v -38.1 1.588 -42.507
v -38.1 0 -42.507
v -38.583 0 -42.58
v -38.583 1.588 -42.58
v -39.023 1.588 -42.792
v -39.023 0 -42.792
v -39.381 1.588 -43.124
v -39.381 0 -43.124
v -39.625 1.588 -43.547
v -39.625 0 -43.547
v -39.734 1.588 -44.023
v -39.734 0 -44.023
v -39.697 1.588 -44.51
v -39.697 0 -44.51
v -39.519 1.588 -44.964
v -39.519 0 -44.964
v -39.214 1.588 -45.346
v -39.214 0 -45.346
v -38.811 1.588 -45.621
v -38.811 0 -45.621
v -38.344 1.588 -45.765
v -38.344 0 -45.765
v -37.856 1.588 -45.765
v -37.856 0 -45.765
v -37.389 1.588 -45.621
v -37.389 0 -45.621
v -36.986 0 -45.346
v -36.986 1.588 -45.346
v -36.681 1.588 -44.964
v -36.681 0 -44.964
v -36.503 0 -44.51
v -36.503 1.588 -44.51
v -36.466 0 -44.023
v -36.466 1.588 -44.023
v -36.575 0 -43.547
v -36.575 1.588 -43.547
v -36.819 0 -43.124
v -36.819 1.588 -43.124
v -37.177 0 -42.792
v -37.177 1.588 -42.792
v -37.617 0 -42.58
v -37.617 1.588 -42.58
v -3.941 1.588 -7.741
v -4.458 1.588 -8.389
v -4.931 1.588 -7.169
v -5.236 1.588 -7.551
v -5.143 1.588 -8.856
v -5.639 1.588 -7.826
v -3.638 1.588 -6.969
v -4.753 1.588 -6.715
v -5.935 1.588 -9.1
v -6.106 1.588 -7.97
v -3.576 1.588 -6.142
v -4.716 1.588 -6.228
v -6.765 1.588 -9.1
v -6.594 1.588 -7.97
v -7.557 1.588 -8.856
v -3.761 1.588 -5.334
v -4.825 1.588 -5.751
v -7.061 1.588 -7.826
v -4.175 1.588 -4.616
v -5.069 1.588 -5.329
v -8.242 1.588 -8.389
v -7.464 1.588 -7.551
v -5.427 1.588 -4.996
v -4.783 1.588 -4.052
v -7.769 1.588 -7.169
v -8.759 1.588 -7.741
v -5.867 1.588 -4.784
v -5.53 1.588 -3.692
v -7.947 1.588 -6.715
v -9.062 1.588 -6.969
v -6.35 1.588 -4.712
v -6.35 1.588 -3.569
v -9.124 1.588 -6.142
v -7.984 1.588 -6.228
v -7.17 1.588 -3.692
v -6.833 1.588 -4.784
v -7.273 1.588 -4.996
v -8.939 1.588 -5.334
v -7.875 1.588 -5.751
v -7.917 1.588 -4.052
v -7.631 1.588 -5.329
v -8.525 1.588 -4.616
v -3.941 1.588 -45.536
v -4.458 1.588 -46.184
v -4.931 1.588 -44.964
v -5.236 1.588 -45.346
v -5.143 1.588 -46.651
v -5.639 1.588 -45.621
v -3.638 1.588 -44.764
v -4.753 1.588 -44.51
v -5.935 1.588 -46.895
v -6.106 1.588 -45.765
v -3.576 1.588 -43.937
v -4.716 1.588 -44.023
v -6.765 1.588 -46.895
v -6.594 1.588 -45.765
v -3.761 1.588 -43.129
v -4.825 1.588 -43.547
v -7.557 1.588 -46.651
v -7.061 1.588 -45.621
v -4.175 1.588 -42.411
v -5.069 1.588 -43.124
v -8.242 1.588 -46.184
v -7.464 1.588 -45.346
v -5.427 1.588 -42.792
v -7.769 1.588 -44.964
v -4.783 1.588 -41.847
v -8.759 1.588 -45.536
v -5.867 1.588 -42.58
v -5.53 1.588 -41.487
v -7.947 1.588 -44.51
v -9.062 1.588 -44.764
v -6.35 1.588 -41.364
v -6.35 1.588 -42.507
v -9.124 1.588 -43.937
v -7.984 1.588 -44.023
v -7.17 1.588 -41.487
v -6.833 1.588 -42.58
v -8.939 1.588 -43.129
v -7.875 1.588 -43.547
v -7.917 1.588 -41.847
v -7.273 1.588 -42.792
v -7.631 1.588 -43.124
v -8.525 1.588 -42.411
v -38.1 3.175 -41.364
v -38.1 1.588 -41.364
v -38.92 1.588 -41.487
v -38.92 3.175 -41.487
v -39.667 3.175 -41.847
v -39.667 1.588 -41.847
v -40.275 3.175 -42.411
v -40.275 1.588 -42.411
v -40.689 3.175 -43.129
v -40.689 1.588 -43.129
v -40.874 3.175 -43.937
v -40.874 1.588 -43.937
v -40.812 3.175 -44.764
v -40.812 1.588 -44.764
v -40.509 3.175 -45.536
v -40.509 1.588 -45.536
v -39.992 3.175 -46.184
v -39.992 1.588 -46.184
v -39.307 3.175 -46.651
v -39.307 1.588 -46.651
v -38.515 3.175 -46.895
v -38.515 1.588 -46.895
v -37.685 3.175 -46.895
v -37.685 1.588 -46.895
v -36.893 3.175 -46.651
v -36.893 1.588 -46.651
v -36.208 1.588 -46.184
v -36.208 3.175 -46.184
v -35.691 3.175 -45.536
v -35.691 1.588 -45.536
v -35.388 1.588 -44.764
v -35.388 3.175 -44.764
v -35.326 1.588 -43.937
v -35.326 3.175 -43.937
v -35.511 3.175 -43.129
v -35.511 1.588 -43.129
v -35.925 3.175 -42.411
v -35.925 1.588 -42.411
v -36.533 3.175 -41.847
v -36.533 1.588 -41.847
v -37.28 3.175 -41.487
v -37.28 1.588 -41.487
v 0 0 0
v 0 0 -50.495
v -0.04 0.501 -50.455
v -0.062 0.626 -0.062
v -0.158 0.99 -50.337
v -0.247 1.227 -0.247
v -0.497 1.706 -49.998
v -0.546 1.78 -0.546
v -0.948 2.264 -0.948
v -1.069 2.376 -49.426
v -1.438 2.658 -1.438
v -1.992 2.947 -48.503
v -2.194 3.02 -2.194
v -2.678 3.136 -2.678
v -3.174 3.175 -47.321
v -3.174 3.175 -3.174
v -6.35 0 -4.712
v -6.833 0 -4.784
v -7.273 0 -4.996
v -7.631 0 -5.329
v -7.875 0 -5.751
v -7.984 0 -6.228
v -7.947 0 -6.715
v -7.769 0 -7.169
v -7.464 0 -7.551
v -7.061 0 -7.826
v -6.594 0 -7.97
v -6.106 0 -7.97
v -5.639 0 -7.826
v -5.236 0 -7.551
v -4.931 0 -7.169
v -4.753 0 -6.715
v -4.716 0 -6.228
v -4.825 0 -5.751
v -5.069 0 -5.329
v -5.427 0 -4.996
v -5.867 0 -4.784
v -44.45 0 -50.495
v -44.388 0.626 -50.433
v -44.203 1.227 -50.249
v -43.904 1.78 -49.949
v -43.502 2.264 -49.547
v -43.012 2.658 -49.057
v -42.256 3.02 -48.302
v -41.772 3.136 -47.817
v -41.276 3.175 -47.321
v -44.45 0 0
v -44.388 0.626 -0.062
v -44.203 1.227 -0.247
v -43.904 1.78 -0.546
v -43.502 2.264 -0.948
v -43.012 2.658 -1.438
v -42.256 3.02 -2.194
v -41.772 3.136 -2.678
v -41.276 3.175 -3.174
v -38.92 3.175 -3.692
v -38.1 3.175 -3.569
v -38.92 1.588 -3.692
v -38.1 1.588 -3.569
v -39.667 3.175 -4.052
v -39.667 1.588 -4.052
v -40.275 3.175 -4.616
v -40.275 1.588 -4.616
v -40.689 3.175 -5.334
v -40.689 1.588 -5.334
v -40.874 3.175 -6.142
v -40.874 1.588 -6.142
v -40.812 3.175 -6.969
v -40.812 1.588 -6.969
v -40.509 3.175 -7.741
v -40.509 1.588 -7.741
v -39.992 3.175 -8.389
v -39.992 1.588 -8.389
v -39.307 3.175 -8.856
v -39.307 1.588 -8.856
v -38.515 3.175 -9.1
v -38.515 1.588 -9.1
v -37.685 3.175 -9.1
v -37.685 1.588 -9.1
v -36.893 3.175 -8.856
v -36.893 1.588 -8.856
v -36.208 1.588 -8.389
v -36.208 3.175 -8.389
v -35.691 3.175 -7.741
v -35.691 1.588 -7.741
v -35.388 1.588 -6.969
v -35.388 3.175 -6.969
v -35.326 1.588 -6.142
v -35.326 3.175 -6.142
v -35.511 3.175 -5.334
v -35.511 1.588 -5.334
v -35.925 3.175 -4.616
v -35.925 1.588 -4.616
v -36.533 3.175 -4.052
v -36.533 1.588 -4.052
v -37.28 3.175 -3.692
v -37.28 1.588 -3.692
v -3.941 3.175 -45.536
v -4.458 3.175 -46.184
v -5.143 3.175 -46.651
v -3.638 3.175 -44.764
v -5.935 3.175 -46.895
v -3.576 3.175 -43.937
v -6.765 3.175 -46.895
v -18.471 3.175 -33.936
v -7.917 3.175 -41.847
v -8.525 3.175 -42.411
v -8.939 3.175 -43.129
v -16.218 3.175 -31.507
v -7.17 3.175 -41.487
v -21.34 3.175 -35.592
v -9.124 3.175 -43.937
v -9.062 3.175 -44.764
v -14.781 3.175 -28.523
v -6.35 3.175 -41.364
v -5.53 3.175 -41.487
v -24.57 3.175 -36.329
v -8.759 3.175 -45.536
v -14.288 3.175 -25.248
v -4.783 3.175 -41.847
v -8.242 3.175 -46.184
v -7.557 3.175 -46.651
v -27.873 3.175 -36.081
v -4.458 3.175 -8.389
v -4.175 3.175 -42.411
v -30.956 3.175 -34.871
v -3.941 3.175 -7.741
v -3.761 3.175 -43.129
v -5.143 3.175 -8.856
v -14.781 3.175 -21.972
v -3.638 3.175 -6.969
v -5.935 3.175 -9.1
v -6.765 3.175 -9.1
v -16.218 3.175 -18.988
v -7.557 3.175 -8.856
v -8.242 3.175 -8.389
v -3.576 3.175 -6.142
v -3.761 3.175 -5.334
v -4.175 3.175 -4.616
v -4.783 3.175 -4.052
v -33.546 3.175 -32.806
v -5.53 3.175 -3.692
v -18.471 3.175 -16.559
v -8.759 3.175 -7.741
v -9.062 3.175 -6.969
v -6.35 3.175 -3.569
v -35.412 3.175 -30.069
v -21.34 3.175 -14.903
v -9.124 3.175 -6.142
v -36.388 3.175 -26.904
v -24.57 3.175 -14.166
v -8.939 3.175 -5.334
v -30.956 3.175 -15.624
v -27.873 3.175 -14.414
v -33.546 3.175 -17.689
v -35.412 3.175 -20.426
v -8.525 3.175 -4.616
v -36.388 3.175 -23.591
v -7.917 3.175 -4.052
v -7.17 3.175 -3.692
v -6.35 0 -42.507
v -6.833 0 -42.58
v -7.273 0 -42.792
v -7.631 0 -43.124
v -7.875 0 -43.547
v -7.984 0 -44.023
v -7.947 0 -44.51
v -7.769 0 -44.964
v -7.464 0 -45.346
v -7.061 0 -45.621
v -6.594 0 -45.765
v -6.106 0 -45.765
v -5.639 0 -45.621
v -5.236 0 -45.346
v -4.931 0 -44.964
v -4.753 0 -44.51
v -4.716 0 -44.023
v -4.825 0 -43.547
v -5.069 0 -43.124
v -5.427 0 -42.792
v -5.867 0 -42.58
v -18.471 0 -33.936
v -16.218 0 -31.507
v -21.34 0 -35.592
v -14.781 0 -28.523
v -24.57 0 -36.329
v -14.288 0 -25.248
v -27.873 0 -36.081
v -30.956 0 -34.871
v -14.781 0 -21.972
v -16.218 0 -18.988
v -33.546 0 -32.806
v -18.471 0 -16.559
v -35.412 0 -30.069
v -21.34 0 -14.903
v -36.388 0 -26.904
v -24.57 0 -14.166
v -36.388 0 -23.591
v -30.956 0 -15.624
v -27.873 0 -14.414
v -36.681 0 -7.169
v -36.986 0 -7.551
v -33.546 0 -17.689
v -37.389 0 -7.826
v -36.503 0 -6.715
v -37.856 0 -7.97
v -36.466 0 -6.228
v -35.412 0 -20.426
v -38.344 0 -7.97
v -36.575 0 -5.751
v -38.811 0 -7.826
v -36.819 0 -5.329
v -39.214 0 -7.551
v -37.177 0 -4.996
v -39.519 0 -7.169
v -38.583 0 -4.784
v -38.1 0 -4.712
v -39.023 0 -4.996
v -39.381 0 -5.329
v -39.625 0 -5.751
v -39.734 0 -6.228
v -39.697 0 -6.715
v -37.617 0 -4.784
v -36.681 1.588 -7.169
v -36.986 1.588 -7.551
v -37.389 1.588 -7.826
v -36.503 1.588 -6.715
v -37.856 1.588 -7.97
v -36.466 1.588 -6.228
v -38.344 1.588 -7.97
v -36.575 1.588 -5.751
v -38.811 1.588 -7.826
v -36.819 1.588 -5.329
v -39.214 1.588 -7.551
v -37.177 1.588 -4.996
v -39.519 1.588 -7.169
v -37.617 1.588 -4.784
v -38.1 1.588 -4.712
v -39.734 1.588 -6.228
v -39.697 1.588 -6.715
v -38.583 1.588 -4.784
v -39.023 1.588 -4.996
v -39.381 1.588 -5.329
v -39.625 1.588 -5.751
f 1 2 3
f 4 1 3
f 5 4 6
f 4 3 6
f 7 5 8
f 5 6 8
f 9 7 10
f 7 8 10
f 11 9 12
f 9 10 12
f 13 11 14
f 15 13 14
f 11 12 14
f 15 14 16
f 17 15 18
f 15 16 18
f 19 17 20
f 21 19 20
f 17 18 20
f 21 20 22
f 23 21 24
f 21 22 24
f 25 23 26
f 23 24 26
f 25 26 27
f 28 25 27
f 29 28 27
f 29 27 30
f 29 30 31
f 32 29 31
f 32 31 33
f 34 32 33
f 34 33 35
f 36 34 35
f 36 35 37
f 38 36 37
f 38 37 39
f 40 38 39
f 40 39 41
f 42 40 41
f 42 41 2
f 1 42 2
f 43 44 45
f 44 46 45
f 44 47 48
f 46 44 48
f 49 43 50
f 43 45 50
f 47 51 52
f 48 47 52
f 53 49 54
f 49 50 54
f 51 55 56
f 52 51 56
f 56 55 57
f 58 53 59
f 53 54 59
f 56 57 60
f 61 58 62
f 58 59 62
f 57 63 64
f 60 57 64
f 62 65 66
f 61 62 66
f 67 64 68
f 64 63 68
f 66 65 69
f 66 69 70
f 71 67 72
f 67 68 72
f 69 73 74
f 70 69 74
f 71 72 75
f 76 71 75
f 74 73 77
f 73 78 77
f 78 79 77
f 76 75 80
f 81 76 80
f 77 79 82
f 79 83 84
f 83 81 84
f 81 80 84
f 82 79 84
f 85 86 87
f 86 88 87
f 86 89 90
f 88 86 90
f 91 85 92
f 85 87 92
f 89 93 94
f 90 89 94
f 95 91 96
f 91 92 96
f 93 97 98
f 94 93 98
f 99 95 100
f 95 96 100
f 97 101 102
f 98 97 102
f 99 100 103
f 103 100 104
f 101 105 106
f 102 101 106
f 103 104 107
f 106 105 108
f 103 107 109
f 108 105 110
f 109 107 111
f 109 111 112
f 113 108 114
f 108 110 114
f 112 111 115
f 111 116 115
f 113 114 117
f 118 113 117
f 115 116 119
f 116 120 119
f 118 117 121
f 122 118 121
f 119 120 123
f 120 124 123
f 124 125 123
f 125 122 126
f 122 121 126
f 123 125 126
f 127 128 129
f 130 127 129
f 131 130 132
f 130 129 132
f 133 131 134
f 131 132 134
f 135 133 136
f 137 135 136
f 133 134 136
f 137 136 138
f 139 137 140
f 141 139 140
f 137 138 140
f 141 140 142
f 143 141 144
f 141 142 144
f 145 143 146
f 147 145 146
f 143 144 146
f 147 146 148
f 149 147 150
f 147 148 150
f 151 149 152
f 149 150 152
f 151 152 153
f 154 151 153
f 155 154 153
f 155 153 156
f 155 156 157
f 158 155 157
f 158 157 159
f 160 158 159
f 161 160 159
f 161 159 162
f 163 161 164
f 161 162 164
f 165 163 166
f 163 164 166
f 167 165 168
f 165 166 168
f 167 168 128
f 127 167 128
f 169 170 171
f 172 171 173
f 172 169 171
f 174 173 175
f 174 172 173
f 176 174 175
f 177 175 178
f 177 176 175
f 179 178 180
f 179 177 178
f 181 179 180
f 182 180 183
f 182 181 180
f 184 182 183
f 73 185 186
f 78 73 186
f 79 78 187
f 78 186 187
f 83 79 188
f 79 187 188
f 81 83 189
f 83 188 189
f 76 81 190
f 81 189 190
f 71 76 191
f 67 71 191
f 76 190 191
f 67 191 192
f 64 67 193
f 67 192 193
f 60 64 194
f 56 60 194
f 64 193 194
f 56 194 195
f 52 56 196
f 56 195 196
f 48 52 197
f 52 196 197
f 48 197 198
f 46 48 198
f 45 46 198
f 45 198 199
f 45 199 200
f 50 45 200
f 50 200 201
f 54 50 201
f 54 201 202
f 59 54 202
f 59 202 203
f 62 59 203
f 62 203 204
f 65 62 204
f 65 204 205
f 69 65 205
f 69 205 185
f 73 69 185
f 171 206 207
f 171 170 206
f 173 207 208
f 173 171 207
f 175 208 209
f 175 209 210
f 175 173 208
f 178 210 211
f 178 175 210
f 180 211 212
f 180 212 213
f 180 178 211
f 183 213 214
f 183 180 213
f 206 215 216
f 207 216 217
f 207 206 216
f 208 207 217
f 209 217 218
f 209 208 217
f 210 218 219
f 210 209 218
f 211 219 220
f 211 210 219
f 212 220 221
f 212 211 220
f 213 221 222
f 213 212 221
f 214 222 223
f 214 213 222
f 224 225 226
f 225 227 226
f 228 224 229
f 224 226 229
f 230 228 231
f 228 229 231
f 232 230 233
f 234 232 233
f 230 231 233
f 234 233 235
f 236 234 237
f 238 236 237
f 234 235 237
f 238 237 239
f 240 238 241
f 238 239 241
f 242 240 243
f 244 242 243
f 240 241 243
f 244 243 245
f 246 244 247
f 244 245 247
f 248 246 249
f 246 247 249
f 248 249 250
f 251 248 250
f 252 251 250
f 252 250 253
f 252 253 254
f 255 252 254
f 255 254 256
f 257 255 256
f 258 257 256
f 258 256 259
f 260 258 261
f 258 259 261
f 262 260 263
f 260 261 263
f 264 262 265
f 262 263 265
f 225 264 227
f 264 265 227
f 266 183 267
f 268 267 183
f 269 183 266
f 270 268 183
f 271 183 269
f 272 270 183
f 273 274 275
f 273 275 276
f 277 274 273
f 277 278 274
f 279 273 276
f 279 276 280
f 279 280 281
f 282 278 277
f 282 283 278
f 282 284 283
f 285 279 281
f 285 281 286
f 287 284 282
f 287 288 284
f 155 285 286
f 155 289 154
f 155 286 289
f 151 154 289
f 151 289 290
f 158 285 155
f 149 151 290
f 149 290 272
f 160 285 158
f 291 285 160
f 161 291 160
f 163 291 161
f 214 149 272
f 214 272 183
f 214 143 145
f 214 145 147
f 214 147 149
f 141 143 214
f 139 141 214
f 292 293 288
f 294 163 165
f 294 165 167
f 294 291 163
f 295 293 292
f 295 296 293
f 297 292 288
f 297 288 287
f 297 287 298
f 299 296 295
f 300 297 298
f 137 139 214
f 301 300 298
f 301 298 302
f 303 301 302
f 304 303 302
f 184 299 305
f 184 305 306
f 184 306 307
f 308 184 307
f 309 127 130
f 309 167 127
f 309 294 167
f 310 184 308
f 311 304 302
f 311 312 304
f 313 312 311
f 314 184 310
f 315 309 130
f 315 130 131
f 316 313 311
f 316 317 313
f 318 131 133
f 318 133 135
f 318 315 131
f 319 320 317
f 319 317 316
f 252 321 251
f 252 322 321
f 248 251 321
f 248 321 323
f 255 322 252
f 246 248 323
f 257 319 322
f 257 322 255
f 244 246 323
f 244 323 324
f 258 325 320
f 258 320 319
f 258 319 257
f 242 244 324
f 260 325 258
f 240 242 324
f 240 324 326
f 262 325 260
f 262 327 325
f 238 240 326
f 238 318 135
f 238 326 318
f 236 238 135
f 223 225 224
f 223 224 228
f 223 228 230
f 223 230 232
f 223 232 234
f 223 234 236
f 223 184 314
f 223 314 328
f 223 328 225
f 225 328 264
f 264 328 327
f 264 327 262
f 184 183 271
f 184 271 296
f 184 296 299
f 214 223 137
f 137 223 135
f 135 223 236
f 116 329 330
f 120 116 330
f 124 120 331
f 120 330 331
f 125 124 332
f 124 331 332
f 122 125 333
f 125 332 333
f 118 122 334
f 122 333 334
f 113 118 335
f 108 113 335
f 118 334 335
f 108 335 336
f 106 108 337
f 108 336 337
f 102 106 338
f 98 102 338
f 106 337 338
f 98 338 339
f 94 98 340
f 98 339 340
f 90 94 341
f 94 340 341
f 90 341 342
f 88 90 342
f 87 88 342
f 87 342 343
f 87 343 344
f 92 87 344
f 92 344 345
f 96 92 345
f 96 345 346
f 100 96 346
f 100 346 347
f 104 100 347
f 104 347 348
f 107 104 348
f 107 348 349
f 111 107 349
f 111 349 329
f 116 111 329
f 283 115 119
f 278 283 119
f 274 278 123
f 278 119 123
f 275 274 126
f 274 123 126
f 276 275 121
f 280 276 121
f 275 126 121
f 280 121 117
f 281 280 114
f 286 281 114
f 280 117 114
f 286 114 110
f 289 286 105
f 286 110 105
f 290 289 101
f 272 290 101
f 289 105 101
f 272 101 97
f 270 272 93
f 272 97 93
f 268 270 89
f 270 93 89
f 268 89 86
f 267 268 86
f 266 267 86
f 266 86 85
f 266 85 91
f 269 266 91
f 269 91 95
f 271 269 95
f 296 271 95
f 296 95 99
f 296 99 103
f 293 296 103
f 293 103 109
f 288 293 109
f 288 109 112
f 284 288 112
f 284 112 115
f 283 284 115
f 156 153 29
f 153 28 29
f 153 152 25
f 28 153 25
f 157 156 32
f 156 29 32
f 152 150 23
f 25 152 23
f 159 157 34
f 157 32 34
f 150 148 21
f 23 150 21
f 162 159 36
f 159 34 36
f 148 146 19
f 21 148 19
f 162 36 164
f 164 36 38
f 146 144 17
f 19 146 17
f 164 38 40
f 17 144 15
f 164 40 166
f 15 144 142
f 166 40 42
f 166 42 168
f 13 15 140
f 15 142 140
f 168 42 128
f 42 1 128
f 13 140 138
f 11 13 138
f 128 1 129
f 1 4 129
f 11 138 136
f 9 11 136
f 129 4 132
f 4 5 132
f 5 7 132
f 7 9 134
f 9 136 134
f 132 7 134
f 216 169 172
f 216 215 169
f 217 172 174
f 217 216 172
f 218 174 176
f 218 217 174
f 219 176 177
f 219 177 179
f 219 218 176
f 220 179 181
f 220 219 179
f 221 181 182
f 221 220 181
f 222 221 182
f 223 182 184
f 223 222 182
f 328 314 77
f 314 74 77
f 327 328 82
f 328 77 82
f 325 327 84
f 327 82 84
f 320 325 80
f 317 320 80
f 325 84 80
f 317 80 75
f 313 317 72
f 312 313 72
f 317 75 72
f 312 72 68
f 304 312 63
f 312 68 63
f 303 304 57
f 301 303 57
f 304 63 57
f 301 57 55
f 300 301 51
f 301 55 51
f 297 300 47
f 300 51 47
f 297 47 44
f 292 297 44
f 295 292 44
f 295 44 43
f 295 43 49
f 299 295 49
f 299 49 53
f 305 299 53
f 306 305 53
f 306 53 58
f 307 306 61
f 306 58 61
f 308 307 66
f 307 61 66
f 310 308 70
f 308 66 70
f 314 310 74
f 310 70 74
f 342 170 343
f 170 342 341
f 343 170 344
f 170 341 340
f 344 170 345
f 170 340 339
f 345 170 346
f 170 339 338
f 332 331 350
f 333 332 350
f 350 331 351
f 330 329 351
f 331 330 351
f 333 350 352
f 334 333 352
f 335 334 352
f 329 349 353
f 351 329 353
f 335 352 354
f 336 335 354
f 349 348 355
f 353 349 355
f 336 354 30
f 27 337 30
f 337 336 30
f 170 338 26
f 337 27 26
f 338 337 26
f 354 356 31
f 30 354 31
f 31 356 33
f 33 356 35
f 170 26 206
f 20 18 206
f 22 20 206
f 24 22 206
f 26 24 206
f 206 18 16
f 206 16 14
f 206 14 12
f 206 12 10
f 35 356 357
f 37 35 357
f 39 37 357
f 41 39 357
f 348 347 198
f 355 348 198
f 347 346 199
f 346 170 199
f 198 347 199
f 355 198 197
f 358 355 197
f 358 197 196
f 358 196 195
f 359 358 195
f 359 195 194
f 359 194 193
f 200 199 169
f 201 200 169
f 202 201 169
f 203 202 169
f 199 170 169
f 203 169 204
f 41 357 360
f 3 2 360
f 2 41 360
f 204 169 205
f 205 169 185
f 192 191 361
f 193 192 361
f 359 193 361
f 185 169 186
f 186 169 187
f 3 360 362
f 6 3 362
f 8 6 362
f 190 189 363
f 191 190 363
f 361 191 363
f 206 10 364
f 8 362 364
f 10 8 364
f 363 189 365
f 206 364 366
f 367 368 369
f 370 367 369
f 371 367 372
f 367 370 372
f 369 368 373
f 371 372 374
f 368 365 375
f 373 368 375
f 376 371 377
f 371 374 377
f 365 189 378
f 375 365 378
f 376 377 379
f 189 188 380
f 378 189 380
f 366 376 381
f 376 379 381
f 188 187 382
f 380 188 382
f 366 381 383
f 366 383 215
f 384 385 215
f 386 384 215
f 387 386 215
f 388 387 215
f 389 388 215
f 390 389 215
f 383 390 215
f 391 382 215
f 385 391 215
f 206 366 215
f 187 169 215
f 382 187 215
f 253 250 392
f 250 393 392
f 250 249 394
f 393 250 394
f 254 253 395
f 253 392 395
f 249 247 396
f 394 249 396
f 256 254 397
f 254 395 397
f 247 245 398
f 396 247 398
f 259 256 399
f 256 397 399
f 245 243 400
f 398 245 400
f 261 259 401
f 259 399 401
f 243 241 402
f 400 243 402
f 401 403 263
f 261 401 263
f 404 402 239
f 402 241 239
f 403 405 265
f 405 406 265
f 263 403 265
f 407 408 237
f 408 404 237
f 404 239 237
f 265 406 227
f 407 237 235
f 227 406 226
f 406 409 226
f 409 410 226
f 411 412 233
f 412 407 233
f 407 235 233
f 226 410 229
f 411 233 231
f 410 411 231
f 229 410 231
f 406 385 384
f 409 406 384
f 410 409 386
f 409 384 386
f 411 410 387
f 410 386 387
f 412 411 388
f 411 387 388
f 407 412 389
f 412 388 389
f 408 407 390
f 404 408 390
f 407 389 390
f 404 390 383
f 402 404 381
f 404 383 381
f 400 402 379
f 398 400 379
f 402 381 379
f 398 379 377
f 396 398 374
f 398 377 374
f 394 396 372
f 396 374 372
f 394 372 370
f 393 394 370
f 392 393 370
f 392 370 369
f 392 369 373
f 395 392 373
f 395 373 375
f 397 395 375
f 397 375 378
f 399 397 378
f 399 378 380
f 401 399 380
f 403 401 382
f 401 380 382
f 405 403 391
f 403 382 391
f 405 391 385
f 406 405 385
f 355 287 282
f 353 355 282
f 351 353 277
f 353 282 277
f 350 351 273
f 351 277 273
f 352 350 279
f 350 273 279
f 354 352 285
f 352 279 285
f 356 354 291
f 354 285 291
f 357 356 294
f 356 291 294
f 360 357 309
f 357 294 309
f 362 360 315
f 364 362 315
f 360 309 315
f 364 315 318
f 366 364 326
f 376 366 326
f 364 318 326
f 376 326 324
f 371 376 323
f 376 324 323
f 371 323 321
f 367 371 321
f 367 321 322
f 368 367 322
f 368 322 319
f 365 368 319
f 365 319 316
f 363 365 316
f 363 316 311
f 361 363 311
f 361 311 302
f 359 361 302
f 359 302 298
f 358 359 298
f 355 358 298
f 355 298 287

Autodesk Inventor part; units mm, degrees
ref_plane "YZ Plane" through (0, 0, 0) normal (1, 0, 0) x (0, 1, 0)
ref_plane "XZ Plane" through (0, 0, 0) normal (0, 1, 0) x (-1, 0, 0)
ref_plane "XY Plane" through (0, 0, 0) normal (0, 0, 1) x (1, 0, 0)
sketch "Sketch1" plane through (0, 0, 0) normal (0, 1, 0) x (-1, 0, 0)
  line L0 (0, 0) -> (44.45, 0)
  line L1 (44.45, 0) -> (44.45, -50.4952)
  line L2 (44.45, -50.4952) -> (0, -50.4952)
  line L3 (0, -50.4952) -> (0, 0)
  dimension "d0" = 44.45
  dimension "d1" = 50.4952
extrude "Extrusion1" add sketch "Sketch1" along normal blind 3.175
sketch "Sketch2" plane through (0, 3.175, 0) normal (0, 1, 0) x (1, 0, 0)
  line L0 (-44.45, 50.4952) -> (-44.45, 0) projected
  line L1 (-44.45, 50.4952) -> (-38.1, 50.4952)
  line L2 (0, 50.4952) -> (-44.45, 50.4952) projected
  line L3 (-38.1, 50.4952) -> (-38.1, 44.1452)
  line L4 (-44.45, 0) -> (0, 0) projected
  line L5 (0, 0) -> (-6.35, 0)
  line L6 (-6.35, 0) -> (-6.35, 6.35)
  line L7 (-44.45, 50.4952) -> (-44.45, 25.2476)
  line L8 (-44.45, 25.2476) -> (-25.4, 25.2476)
  circle A0 centre (-25.4, 25.2476) radius 11.1125
  line L9 (-44.45, 0) -> (-38.1, 0)
  line L10 (-38.1, 0) -> (-38.1, 6.35)
  line L11 (0, 0) -> (0, 50.4952) projected
  line L12 (0, 50.4952) -> (-6.35, 50.4952)
  line L13 (-6.35, 44.1452) -> (-6.35, 50.4952)
  dimension "d4" = 6.35
  dimension "d5" = 6.35
  dimension "d6" = 6.35
  dimension "d7" = 6.35
  dimension "d15" = 25.2476
  dimension "d16" = 19.05
  dimension "d17" = 22.225
  dimension "d21" = 6.35
  dimension "d22" = 6.35
  dimension "d23" = 6.35
hole "Hole1" at (-6.35, 3.175, -6.35) at (-38.1, 3.175, -44.1452) at (-6.35, 3.175, -44.1452) at (-38.1, 3.175, -6.35) direction (0, -1, 0) diameter 3.2766 depth 12.7 tip angle 118 counterbore diameter 5.5626 counterbore depth 1.5875 clearance for "Socket Head Cap Screw" size "#4" standard "Ansi Unified Screw Threads"
extrude "Extrusion2" cut sketch "Sketch2" against normal blind 3.175 contours A0
fillet "Fillet1" radius 3.175 4 edges at (-44.45, 3.175, -25.2476) (-22.225, 3.175, -50.4952) (0, 3.175, -25.2476) (-22.225, 3.175, 0)
properties part number "sample holder lid for neutron r2"
